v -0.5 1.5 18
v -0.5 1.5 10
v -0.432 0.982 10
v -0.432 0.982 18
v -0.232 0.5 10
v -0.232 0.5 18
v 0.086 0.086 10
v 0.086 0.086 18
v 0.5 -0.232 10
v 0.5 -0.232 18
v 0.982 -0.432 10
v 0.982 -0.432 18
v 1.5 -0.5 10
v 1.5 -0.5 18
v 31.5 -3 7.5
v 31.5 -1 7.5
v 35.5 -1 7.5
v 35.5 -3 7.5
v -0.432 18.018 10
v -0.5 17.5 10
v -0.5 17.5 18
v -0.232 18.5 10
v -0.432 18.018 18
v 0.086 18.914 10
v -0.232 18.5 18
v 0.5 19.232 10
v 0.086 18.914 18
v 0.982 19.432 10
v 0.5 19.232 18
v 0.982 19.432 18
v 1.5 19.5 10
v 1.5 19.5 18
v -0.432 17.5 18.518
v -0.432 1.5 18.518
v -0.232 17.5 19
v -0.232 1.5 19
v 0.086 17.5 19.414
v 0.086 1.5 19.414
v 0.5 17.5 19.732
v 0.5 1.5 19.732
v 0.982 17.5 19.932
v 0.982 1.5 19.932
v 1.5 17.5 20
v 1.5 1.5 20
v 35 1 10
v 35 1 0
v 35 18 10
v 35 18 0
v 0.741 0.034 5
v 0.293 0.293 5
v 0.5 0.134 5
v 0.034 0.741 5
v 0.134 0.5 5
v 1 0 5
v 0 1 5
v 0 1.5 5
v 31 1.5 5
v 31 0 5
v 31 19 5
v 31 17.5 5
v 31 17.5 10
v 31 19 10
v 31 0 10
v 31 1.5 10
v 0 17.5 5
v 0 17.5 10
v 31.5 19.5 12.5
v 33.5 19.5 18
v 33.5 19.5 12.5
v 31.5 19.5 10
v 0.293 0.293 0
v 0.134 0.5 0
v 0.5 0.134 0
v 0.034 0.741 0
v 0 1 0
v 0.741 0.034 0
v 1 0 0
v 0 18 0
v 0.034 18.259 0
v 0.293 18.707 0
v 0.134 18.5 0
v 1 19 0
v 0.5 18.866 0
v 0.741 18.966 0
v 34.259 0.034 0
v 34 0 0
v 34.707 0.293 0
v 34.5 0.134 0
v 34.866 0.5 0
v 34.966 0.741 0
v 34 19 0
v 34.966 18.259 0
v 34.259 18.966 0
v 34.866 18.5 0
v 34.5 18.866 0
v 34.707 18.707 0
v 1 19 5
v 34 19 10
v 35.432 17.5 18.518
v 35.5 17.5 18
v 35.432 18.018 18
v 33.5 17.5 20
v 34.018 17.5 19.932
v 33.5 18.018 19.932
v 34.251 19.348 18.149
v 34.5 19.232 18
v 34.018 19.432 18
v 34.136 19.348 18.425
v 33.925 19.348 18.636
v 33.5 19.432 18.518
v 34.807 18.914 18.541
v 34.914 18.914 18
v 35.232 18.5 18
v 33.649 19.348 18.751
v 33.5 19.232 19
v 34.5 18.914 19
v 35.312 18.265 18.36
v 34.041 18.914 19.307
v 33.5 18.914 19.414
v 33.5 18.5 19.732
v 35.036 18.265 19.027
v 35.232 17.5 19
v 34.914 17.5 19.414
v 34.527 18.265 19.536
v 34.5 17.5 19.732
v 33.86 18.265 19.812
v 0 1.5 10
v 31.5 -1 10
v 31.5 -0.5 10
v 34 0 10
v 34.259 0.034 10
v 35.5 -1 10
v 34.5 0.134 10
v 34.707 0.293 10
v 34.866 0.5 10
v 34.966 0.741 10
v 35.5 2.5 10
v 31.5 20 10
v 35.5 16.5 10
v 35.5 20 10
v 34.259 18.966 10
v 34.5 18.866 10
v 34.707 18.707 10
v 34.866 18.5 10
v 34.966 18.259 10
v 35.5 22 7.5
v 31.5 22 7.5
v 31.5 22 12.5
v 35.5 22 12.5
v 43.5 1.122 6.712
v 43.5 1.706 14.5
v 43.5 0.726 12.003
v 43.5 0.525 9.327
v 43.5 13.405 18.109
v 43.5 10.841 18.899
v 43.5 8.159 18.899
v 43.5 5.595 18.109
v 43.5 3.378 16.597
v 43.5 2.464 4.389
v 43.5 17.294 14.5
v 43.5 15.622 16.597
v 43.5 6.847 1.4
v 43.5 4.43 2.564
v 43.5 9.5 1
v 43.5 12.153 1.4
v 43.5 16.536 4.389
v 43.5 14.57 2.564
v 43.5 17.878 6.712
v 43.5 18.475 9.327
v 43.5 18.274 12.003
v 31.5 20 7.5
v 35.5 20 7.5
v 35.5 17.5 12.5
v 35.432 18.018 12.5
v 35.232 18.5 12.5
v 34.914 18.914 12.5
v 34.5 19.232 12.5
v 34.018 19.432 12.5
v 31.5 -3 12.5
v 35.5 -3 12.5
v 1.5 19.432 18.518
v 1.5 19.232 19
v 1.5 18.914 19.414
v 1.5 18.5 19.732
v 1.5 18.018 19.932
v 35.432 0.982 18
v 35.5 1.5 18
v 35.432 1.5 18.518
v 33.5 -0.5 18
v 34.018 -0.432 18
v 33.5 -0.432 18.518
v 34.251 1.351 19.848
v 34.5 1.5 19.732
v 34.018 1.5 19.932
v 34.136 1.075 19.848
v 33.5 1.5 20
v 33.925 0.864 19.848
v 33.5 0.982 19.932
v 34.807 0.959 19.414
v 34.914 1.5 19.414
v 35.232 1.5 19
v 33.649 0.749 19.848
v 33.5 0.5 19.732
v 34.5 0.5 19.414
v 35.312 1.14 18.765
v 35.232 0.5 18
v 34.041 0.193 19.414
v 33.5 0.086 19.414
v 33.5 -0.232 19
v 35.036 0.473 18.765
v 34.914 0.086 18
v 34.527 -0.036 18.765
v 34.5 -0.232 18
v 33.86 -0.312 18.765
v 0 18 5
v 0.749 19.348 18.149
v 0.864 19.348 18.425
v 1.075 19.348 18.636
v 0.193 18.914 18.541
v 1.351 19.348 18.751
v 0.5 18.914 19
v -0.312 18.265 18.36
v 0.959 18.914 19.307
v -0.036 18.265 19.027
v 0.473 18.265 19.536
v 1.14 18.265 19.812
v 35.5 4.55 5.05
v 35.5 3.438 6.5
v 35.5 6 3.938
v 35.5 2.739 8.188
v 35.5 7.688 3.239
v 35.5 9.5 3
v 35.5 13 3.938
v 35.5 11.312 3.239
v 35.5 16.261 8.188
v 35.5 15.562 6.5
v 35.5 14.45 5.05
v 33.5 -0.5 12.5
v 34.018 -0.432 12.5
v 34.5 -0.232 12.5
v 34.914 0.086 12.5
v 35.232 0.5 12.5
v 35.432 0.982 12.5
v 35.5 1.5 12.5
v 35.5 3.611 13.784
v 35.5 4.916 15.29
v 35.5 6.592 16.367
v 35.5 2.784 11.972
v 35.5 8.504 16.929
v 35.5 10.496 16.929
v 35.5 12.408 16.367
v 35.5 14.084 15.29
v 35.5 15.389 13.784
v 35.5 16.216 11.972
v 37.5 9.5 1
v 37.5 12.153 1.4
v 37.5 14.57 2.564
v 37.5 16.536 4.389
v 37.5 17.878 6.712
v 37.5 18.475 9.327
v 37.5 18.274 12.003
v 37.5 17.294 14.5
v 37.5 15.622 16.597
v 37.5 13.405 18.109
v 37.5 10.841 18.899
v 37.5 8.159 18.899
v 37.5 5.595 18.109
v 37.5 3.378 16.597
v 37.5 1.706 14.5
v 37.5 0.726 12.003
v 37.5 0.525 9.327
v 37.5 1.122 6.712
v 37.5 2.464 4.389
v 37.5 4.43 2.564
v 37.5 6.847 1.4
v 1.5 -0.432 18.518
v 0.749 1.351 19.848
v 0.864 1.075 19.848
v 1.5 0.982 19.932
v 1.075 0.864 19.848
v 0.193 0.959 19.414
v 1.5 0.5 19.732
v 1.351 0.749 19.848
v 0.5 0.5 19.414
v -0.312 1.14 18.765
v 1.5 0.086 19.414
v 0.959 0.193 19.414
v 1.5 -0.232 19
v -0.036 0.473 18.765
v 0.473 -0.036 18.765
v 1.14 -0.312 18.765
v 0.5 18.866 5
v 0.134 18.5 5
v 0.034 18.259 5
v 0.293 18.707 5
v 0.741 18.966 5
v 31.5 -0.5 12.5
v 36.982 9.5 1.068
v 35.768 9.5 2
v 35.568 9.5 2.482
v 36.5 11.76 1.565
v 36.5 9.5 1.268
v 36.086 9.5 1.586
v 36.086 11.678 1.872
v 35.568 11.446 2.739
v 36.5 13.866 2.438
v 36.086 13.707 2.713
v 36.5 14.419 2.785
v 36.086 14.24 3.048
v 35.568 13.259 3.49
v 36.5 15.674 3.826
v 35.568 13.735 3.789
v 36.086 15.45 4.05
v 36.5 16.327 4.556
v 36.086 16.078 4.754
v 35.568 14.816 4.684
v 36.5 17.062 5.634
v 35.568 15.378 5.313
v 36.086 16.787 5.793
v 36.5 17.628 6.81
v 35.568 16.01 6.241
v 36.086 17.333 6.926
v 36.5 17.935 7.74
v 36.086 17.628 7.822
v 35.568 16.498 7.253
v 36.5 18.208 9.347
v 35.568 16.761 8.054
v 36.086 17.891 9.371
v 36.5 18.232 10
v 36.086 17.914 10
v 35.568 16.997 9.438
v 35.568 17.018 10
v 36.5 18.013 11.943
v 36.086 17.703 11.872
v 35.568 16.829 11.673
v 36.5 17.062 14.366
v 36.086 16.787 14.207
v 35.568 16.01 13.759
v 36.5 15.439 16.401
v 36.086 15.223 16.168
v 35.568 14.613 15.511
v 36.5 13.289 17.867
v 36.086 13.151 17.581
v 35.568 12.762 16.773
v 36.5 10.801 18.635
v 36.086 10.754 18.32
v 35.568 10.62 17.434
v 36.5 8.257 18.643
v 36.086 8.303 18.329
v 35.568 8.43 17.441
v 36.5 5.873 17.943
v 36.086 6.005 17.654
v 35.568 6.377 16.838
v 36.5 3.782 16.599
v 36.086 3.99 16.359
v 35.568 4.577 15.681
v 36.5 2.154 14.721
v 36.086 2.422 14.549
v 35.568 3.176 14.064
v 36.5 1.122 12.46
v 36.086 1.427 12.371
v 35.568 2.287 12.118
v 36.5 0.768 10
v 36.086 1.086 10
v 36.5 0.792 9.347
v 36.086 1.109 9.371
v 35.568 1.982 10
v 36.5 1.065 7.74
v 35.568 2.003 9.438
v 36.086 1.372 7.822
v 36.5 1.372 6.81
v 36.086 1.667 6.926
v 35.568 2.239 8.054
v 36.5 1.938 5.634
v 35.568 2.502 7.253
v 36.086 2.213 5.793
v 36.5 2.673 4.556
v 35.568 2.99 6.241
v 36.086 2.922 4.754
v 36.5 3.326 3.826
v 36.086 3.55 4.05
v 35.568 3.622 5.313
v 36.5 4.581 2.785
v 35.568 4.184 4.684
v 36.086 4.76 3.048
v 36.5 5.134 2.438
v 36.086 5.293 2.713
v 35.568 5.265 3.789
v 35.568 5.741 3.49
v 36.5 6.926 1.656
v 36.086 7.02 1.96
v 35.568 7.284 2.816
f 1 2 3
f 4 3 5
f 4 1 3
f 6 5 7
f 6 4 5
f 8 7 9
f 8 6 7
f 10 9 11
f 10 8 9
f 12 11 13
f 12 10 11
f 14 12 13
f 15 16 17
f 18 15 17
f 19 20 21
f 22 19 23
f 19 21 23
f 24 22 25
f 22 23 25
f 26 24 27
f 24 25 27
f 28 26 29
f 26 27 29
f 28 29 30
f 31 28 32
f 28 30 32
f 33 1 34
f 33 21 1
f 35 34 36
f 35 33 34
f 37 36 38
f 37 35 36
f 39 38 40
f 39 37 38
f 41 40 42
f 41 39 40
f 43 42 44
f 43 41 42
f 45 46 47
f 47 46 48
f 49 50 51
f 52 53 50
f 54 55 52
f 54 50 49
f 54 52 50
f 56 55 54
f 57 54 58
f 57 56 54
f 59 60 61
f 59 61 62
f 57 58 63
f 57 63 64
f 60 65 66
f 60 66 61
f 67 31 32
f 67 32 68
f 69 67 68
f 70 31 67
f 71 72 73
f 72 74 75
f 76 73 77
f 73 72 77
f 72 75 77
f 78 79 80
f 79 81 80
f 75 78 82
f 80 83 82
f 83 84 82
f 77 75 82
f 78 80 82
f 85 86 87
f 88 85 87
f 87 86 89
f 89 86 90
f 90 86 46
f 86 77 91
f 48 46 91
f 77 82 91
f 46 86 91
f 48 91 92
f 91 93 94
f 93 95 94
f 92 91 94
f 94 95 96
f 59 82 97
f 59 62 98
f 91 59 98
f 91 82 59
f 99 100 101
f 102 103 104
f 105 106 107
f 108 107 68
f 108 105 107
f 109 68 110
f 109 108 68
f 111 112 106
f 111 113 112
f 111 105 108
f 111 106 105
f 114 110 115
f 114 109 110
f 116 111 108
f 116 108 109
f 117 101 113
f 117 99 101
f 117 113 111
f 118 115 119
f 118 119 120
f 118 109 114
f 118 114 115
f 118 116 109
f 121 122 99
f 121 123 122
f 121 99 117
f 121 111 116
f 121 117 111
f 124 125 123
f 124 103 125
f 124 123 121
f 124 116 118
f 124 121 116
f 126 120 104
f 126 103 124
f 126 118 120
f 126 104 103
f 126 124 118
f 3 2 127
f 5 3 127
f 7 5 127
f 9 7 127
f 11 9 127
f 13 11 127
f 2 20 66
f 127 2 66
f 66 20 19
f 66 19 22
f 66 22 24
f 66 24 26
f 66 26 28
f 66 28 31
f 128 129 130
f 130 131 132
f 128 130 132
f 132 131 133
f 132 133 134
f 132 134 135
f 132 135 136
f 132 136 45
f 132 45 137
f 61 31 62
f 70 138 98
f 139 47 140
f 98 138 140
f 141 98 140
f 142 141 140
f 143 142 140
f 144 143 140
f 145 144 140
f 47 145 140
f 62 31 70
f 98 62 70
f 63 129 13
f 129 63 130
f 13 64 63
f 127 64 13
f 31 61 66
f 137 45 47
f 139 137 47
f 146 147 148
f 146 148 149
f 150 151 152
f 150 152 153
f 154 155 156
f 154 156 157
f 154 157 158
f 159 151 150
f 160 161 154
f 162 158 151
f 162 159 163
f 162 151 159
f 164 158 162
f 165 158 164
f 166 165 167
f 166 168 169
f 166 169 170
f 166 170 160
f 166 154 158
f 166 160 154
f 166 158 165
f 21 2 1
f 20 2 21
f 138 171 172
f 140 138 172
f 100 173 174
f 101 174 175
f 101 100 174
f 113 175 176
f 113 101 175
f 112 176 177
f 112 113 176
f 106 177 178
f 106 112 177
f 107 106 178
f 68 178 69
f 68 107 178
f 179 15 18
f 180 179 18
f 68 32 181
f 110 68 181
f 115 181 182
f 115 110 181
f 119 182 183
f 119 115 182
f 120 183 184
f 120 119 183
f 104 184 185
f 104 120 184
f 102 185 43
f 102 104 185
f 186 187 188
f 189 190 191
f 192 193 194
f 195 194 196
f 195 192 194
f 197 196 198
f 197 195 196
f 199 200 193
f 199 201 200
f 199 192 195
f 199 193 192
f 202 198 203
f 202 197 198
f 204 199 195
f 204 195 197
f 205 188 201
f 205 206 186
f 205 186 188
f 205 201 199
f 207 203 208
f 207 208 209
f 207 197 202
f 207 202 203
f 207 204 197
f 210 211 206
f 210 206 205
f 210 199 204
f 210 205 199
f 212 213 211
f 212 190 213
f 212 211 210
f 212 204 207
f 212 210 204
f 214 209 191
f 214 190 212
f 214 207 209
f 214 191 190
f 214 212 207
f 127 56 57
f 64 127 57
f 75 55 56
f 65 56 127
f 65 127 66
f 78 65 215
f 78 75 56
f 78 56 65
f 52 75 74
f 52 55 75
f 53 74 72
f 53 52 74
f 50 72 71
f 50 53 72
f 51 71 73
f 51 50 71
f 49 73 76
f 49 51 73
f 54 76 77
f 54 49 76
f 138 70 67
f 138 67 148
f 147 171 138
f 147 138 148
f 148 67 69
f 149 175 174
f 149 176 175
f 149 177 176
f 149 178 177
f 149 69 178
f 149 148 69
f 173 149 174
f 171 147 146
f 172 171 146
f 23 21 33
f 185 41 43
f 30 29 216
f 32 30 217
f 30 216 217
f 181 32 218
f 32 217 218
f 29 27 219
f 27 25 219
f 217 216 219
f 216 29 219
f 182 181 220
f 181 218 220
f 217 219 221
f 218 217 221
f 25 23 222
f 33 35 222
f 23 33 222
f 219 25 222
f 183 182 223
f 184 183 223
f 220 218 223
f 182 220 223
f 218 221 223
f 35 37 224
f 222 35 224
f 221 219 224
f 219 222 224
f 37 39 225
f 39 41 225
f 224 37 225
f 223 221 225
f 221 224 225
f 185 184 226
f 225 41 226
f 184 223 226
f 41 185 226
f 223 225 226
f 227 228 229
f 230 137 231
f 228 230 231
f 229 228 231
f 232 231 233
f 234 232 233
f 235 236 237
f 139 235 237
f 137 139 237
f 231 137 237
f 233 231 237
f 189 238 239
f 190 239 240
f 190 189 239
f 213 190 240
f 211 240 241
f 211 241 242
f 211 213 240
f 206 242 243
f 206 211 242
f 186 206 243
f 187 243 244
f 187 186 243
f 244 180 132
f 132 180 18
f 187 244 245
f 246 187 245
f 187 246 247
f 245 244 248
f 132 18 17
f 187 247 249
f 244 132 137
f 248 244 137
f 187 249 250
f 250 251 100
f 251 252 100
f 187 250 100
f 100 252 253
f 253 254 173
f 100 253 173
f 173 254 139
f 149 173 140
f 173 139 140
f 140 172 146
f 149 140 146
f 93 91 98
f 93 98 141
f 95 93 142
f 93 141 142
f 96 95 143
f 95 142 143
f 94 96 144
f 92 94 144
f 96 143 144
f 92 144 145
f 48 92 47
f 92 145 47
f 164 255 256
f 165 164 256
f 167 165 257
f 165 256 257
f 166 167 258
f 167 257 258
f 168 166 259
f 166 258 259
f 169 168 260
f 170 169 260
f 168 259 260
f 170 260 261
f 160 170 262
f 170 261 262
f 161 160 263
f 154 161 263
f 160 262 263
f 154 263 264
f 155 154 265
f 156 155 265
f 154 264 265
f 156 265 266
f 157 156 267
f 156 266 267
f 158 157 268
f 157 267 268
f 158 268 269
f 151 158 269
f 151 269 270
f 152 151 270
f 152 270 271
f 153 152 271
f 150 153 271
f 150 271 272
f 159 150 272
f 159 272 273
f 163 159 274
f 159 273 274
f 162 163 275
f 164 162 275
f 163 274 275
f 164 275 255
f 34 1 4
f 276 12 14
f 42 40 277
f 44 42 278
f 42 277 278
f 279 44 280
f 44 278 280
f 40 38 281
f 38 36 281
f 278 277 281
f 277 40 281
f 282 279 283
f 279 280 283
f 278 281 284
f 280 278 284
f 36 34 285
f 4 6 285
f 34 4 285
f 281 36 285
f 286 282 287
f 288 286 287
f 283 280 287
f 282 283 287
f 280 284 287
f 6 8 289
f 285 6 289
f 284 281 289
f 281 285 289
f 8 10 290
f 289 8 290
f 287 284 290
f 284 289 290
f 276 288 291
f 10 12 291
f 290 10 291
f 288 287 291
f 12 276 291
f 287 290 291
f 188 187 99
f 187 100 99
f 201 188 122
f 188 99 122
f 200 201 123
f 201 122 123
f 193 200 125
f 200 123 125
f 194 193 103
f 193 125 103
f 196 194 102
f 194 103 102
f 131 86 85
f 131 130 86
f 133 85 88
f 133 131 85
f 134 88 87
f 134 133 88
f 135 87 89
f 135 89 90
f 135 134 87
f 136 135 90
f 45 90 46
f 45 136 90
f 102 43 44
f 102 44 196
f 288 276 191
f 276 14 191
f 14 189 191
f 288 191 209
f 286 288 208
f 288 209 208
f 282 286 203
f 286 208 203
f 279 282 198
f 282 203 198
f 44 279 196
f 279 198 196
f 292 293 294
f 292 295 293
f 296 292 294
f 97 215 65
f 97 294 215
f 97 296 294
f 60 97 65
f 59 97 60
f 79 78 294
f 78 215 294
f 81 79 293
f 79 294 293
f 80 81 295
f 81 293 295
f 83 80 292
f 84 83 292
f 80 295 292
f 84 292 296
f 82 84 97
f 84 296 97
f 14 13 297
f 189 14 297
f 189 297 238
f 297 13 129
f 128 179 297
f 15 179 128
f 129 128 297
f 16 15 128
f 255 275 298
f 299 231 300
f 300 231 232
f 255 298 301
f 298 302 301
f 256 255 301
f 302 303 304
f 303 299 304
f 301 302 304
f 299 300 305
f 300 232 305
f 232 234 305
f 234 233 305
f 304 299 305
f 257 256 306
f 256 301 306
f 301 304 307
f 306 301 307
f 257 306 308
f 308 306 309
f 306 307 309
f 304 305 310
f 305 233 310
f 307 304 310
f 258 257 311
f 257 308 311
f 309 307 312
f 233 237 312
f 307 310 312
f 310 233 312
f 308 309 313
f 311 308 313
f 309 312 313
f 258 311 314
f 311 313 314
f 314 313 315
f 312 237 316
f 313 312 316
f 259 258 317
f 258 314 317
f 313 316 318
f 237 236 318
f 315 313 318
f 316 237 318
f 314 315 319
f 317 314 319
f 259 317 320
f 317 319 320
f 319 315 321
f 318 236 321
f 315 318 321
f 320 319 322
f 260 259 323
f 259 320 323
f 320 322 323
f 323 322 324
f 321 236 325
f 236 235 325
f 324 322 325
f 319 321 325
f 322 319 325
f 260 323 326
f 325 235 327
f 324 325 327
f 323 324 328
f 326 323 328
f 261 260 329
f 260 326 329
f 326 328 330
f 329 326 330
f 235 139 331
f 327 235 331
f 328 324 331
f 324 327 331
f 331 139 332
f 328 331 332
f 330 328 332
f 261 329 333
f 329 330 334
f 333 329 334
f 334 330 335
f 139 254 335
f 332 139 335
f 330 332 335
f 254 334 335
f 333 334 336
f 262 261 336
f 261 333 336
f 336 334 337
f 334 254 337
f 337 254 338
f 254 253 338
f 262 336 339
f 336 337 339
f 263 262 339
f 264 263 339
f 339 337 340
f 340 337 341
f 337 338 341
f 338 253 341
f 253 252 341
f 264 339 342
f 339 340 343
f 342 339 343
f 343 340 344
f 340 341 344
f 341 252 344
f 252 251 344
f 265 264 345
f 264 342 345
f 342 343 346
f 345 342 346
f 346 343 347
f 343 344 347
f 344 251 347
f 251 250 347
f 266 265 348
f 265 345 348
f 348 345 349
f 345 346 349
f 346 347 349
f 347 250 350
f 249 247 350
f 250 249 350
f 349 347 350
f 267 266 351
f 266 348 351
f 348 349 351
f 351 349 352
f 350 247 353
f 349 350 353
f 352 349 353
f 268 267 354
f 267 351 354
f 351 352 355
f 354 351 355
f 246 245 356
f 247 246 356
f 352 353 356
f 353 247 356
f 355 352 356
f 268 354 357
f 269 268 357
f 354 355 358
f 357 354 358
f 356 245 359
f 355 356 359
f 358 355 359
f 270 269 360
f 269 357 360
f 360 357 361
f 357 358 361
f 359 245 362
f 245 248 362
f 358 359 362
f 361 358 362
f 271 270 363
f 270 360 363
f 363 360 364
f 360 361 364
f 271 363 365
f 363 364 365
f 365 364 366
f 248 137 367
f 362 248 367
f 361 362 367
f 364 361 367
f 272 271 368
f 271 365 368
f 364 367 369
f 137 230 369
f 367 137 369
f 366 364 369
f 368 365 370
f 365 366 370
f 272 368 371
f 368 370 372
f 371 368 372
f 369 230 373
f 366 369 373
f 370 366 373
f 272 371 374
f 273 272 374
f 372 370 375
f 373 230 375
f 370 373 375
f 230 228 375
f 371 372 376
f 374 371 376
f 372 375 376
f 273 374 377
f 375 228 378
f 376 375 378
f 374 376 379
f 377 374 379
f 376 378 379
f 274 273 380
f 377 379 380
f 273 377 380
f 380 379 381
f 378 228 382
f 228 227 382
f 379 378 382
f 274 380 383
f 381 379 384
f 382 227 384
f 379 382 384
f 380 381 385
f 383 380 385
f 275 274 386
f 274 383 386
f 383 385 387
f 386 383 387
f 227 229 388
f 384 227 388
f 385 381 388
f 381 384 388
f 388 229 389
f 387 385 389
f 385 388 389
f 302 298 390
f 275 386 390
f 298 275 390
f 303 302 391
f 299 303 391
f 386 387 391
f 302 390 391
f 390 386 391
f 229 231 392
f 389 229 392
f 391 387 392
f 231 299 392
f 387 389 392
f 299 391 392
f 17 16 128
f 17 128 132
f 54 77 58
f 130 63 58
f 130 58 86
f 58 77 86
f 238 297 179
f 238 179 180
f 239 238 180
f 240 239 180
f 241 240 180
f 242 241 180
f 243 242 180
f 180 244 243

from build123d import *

# Parameters (mm, degrees)
BOX002_W       = 32
BOX002_H       = 2
BOX002_DEPTH   = 5
BOX001_W       = 32
BOX001_H       = 2
BOX001_DEPTH   = 5
BOX_W          = 35
BOX_H          = 19
BOX_DEPTH      = 10
FILLET001_R    = 1
BOX003_W       = 36
BOX003_H       = 20
BOX003_DEPTH   = 10
FILLET002_R    = 2
BOX005_W       = 6
BOX005_H       = 21
BOX005_DEPTH   = 3
BOX004_W       = 4
BOX004_H       = 25
BOX004_DEPTH   = 5
CYLINDER_R     = 9
CYLINDER_DEPTH = 8
FILLET_R       = 2


with BuildPart() as box002:
    # Box002 → Box002 (new body)
    with BuildSketch(Plane(origin=(-1, 17.5, 5), x_dir=(1, 0, 0), z_dir=(0, 0, 1))):
        with Locations((16, 1)):
            Rectangle(BOX002_W, BOX002_H)
    extrude(amount=BOX002_DEPTH)


with BuildPart() as fusion:
    # Box001 → Box001 (new body)
    with BuildSketch(Plane(origin=(-1, -0.5, 5), x_dir=(1, 0, 0), z_dir=(0, 0, 1))):
        with Locations((16, 1)):
            Rectangle(BOX001_W, BOX001_H)
    extrude(amount=BOX001_DEPTH)

    # Fusion: union Box002
    add(box002.part)


with BuildPart() as fillet001:
    # Box → Box (new body)
    with BuildSketch(Plane.XY):
        with Locations((17.5, 9.5)):
            Rectangle(BOX_W, BOX_H)
    extrude(amount=BOX_DEPTH)

    # Cut: cut Fusion
    add(fusion.part, mode=Mode.SUBTRACT)

    # Fillet001
    fillet001_edges = [fillet001.edges().sort_by_distance(p)[0] for p in [
        (0, 0, 2.5),
        (0, 19, 2.5),
        (35, 0, 5),
        (35, 19, 5),
    ]]
    fillet(fillet001_edges, radius=FILLET001_R)


with BuildPart() as fillet002:
    # Box003 → Box003 (new body)
    with BuildSketch(Plane(origin=(-0.5, -0.5, 10), x_dir=(1, 0, 0), z_dir=(0, 0, 1))):
        with Locations((18, 10)):
            Rectangle(BOX003_W, BOX003_H)
    extrude(amount=BOX003_DEPTH)

    # Fillet002
    fillet002_edges = [fillet002.edges().sort_by_distance(p)[0] for p in [
        (-0.5, -0.5, 15),
        (-0.5, 9.5, 20),
        (-0.5, 19.5, 15),
        (35.5, -0.5, 15),
        (35.5, 9.5, 20),
        (35.5, 19.5, 15),
        (17.5, -0.5, 20),
        (17.5, 19.5, 20),
    ]]
    fillet(fillet002_edges, radius=FILLET002_R)


with BuildPart() as box005:
    # Box005 → Box005 (new body)
    with BuildSketch(Plane(origin=(30.5, -1, 7), x_dir=(1, 0, 0), z_dir=(0, 0, 1))):
        with Locations((3, 10.5)):
            Rectangle(BOX005_W, BOX005_H)
    extrude(amount=BOX005_DEPTH)


with BuildPart() as cut001:
    # Box004 → Box004 (new body)
    with BuildSketch(Plane(origin=(31.5, -3, 7.5), x_dir=(1, 0, 0), z_dir=(0, 0, 1))):
        with Locations((2, 12.5)):
            Rectangle(BOX004_W, BOX004_H)
    extrude(amount=BOX004_DEPTH)

    # Cut001: cut Box005
    add(box005.part, mode=Mode.SUBTRACT)


with BuildPart() as fusion001:
    # Cylinder → Cylinder (new body)
    with BuildSketch(Plane(origin=(35.5, 9.5, 10), x_dir=(0, 0, -1), z_dir=(1, 0, 0))):
        Circle(CYLINDER_R)
    extrude(amount=CYLINDER_DEPTH)

    # Fillet
    fillet_edges = [fusion001.edges().sort_by_distance(p)[0] for p in [
        (35.5, 9.5, 19),
    ]]
    fillet(fillet_edges, radius=FILLET_R)

    # Fusion001: union Fillet001, Fillet002, Cut001
    add(fillet001.part)
    add(fillet002.part)
    add(cut001.part)


solid = fusion001.part
